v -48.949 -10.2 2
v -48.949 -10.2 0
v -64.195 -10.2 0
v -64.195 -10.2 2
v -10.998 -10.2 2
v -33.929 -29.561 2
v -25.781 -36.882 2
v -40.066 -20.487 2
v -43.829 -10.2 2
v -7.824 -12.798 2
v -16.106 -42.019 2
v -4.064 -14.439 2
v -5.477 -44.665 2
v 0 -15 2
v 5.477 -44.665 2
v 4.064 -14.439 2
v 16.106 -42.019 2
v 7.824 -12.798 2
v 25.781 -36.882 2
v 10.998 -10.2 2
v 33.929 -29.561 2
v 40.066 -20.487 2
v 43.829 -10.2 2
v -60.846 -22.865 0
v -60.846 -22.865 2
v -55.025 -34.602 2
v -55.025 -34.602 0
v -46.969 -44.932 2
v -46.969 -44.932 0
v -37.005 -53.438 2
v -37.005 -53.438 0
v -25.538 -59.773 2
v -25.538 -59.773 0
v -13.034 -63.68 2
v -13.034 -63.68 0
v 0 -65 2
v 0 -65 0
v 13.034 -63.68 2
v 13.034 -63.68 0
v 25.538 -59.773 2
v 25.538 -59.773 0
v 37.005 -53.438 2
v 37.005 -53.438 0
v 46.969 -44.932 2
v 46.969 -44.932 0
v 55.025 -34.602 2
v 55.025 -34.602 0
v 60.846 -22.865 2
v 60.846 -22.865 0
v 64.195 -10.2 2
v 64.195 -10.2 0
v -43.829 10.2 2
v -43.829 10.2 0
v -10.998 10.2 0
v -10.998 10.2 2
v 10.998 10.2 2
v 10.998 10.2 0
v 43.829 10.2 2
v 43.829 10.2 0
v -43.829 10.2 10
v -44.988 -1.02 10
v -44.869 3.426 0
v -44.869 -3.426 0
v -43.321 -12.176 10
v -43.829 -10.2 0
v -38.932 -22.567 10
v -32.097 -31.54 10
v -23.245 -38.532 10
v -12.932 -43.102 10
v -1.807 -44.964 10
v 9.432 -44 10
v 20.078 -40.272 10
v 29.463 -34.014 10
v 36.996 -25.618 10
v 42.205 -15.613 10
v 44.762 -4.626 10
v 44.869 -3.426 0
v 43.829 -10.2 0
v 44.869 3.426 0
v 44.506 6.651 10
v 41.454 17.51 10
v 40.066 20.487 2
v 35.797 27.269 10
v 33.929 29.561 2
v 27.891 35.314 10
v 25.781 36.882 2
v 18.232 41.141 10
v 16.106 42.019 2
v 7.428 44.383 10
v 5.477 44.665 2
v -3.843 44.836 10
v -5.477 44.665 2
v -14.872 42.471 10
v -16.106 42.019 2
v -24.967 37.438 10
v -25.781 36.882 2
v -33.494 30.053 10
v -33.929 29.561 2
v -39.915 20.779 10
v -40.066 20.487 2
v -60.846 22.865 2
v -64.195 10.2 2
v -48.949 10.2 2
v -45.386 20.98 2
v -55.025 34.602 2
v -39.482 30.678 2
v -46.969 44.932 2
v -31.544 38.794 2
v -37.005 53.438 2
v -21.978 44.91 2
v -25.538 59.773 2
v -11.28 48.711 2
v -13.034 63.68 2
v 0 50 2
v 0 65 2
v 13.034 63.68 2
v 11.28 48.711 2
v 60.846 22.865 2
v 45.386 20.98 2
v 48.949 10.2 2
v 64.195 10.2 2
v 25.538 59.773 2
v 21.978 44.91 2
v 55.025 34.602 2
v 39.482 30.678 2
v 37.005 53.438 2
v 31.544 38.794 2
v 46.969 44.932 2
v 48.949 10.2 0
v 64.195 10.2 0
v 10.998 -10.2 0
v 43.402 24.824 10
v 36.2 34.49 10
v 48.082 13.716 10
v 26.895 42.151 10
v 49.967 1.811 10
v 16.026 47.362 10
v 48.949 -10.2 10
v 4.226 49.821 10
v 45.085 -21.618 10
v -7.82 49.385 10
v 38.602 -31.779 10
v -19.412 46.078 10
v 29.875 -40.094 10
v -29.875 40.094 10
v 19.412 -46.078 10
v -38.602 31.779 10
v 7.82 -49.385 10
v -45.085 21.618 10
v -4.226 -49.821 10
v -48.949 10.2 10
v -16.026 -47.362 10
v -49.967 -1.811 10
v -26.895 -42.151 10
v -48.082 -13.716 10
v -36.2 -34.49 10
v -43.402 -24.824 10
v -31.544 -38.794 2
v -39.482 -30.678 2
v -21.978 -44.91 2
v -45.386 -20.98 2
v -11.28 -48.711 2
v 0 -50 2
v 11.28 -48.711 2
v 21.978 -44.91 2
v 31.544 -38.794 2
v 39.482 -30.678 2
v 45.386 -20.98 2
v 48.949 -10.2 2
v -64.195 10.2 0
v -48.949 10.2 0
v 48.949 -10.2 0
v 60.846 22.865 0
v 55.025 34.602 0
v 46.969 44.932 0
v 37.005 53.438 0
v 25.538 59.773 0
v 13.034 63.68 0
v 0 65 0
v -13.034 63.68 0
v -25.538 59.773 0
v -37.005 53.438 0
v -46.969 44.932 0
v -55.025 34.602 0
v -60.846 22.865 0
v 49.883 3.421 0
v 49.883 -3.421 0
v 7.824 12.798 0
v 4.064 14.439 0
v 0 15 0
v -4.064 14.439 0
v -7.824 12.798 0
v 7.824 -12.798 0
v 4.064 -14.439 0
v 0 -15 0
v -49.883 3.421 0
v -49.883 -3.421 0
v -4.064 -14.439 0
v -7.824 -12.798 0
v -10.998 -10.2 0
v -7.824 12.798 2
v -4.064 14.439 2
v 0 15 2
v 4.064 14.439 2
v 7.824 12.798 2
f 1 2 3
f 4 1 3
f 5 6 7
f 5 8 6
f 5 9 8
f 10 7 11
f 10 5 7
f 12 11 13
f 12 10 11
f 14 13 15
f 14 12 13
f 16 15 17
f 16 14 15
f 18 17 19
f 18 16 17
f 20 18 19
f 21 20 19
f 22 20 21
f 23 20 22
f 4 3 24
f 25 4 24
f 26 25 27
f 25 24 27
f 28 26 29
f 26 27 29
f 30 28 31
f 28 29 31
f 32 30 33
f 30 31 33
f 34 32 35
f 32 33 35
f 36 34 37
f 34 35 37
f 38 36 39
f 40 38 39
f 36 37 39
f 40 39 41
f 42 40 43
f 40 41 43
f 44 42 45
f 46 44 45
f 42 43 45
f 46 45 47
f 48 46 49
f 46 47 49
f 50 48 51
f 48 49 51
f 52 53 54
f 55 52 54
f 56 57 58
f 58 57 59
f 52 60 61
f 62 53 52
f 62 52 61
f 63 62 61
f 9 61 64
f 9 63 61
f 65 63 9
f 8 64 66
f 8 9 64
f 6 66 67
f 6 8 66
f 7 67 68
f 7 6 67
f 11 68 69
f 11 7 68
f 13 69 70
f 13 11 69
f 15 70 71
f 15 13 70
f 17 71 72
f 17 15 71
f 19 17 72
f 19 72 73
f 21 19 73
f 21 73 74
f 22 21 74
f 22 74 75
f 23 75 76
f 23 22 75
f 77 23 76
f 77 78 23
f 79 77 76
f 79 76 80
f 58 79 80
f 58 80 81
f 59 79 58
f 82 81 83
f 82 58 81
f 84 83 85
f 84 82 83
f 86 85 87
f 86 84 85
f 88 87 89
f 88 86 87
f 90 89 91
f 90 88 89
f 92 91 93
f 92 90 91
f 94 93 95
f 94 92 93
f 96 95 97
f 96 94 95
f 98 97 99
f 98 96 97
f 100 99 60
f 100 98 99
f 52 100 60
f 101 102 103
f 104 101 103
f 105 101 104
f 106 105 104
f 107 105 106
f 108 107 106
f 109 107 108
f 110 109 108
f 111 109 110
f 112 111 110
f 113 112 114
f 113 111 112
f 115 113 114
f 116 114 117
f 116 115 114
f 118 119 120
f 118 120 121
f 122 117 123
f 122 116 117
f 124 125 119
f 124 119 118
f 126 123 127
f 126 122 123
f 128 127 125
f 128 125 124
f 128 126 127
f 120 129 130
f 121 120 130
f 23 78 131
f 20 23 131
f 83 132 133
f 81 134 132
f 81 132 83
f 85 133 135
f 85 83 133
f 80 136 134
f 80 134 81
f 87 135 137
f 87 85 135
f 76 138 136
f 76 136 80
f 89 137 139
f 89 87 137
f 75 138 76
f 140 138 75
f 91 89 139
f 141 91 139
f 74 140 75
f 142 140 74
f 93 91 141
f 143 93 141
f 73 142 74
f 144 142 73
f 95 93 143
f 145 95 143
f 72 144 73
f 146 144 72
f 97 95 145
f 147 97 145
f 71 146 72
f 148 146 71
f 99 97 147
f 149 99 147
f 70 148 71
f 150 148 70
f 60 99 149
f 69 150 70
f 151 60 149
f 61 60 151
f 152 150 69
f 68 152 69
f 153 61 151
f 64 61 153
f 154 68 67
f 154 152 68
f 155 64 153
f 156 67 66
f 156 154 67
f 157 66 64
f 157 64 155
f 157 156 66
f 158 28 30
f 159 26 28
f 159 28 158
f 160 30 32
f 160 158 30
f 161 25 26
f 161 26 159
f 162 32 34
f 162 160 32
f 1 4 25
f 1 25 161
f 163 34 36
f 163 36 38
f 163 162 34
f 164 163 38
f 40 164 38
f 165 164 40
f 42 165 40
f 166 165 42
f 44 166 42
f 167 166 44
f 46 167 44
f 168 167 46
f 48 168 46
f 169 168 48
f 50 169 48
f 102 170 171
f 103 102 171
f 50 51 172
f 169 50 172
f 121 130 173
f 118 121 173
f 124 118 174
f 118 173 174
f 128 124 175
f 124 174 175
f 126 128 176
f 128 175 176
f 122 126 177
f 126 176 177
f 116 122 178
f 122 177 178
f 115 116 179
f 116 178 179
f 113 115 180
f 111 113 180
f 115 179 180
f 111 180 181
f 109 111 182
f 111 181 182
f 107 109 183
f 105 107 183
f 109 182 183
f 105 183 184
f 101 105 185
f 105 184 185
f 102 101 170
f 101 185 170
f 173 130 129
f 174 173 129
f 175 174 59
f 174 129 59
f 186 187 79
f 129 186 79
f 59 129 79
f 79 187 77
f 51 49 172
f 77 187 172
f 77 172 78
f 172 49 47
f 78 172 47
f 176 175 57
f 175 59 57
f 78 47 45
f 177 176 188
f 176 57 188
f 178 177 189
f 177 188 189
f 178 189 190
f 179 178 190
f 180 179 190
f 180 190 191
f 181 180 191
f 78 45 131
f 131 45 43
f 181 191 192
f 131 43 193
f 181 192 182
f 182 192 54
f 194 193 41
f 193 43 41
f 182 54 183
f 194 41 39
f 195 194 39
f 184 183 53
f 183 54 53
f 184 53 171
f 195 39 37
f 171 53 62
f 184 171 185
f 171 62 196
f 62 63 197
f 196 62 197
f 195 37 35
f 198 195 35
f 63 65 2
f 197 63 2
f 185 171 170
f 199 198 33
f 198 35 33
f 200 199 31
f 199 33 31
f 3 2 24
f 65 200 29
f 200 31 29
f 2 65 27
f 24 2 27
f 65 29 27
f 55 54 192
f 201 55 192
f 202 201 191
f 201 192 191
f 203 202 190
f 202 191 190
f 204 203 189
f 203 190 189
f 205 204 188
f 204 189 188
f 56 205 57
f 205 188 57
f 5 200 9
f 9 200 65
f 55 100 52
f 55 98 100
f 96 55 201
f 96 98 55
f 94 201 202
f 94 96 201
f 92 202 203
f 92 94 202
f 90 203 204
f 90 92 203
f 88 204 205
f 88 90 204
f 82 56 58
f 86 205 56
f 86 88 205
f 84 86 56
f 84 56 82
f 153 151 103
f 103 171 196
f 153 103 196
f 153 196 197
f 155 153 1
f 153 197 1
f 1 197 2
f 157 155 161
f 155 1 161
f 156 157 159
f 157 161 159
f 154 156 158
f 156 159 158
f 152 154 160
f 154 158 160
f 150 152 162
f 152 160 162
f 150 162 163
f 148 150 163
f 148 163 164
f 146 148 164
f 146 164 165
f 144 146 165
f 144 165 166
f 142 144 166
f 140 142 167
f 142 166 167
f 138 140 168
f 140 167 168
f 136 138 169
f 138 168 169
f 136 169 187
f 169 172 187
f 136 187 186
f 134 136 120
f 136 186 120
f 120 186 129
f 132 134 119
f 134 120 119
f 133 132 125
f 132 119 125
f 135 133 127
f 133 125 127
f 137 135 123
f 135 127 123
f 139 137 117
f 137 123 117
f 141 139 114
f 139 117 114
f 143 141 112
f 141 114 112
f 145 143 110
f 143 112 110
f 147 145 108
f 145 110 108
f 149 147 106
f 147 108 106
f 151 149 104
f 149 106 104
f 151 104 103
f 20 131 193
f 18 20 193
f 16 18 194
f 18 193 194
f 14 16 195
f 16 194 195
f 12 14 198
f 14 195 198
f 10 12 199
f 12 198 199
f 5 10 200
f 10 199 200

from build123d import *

# Parameters (mm, degrees)
RESSALTO_EXTRUS_O1_DEPTH   = 2
RESSALTO_EXTRUS_O1_2_DEPTH = 2
ESBO_O2_R                  = 50
ESBO_O2_R_2                = 45
RESSALTO_EXTRUS_O2_DEPTH   = 10


with BuildPart() as part:
    # Esboço1 → Ressalto-extrusão1 (new body)
    with BuildSketch(Plane.XY):
        with BuildLine():
            Line((-64.194703831, 10.2), (-10.998181668, 10.2))
            ThreePointArc((-10.998181668, 10.2), (0, 15), (10.998181668, 10.2))
            Line((10.998181668, 10.2), (64.194703831, 10.2))
            ThreePointArc((64.194703831, 10.2), (0, 65), (-64.194703831, 10.2))
        make_face()
    extrude(amount=RESSALTO_EXTRUS_O1_DEPTH)



with BuildPart() as body_2:
    # Esboço1 → Ressalto-extrus_o1 2 (new body)
    with BuildSketch(Plane.XY):
        with BuildLine():
            Line((-10.998181668, -10.2), (-64.194703831, -10.2))
            ThreePointArc((-64.194703831, -10.2), (0, -65), (64.194703831, -10.2))
            Line((64.194703831, -10.2), (10.998181668, -10.2))
            ThreePointArc((10.998181668, -10.2), (0, -15), (-10.998181668, -10.2))
        make_face()
    extrude(amount=RESSALTO_EXTRUS_O1_2_DEPTH)


with BuildPart() as part_1:
    add(part.part)

    add(body_2.part)  # Ressalto-extrusão2 merges body 2
    # Esboço2 → Ressalto-extrusão2 (add)
    with BuildSketch(Plane.XY):
        with Locations(Location((0, 0, 0), (0, 0, 168.229033732))):
            Circle(ESBO_O2_R)
        with Locations(Location((0, 0, 0), (0, 0, 166.899096466))):
            Circle(ESBO_O2_R_2, mode=Mode.SUBTRACT)
    extrude(amount=RESSALTO_EXTRUS_O2_DEPTH)


solid = part_1.part
